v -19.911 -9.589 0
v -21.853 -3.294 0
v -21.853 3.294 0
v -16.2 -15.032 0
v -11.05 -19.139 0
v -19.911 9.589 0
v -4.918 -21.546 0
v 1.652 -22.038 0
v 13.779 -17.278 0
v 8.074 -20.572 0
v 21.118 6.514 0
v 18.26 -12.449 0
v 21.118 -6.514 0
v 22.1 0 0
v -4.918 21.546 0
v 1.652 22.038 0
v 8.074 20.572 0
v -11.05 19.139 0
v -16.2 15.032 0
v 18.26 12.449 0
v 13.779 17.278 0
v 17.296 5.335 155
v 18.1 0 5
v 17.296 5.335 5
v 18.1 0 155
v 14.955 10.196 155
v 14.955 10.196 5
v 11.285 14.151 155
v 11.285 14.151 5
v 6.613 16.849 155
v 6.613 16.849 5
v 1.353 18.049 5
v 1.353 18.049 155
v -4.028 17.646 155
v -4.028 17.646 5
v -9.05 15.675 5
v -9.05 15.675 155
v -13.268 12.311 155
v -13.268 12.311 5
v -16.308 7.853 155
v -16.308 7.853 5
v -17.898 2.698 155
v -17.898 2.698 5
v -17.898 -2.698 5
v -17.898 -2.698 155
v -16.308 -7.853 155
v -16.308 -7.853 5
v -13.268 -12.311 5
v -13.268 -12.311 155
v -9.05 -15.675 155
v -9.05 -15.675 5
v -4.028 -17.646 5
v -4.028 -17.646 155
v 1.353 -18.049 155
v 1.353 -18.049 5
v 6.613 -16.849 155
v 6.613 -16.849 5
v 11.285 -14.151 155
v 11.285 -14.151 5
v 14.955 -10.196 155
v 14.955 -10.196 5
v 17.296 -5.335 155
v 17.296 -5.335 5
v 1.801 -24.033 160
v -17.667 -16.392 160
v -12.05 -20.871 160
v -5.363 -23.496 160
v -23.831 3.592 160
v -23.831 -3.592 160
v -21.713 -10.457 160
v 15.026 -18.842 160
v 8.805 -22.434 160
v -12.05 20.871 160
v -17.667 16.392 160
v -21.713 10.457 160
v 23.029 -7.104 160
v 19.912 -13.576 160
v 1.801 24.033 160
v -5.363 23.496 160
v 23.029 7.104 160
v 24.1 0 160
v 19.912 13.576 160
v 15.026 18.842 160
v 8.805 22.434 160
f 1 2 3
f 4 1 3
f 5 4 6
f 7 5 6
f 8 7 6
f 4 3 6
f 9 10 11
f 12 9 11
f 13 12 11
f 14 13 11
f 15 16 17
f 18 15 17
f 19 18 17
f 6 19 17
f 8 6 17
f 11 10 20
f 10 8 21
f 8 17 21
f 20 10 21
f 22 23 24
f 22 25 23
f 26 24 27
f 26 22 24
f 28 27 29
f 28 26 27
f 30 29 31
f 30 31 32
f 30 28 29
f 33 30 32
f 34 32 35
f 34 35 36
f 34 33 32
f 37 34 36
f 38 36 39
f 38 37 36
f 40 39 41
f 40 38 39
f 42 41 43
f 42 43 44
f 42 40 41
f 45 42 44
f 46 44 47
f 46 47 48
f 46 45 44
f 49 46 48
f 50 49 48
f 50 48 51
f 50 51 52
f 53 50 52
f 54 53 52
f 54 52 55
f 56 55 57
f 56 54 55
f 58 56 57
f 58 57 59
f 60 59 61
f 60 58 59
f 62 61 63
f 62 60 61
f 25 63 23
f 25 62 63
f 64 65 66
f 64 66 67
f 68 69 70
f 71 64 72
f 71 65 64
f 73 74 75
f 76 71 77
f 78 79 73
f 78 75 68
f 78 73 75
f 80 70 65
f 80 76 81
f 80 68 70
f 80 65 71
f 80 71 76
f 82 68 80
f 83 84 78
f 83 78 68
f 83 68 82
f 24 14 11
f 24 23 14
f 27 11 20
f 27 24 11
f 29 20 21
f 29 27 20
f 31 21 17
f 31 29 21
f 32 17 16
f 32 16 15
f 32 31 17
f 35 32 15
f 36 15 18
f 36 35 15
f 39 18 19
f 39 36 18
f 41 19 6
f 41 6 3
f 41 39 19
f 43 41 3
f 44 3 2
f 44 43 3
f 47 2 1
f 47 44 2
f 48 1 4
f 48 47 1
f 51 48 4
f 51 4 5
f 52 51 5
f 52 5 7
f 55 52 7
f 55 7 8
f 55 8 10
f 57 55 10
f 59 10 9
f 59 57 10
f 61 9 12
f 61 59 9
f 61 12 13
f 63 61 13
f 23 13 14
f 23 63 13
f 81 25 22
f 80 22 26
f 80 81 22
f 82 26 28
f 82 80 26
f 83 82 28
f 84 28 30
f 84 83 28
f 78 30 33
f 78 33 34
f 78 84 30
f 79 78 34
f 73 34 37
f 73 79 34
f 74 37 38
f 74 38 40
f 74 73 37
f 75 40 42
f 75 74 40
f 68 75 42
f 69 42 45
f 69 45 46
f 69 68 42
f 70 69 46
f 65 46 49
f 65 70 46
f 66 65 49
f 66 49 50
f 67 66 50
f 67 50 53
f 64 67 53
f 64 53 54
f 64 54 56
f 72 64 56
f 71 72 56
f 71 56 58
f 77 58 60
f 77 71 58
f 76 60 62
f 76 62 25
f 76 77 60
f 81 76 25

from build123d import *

# Parameters (mm, degrees)
F0_R      = 22.1
F2_R      = 18.1
F7_FACE_R = 18.1
F4_R      = 18.1
F8_FACE_R = 18.1
F6_R      = 24.1


with BuildPart() as f7:
    # F0 (on Top) → F7 section 0
    with BuildSketch(Plane.XY):
        Circle(F0_R)
    # F2 (on offset) → F7 section 1
    with BuildSketch(Plane.XY.offset(5)):
        Circle(F2_R)
    loft()

    # F7_face (on face) → F8 section 0
    with BuildSketch(Plane.XY.offset(5)):
        Circle(F7_FACE_R)
    # F4 (on offset) → F8 section 1
    with BuildSketch(Plane.XY.offset(155)):
        Circle(F4_R)
    loft()

    # F8_face (on face) → F9 section 0
    with BuildSketch(Plane.XY.offset(155)):
        Circle(F8_FACE_R)
    # F6 (on offset) → F9 section 1
    with BuildSketch(Plane.XY.offset(160)):
        Circle(F6_R)
    loft()


solid = f7.part
